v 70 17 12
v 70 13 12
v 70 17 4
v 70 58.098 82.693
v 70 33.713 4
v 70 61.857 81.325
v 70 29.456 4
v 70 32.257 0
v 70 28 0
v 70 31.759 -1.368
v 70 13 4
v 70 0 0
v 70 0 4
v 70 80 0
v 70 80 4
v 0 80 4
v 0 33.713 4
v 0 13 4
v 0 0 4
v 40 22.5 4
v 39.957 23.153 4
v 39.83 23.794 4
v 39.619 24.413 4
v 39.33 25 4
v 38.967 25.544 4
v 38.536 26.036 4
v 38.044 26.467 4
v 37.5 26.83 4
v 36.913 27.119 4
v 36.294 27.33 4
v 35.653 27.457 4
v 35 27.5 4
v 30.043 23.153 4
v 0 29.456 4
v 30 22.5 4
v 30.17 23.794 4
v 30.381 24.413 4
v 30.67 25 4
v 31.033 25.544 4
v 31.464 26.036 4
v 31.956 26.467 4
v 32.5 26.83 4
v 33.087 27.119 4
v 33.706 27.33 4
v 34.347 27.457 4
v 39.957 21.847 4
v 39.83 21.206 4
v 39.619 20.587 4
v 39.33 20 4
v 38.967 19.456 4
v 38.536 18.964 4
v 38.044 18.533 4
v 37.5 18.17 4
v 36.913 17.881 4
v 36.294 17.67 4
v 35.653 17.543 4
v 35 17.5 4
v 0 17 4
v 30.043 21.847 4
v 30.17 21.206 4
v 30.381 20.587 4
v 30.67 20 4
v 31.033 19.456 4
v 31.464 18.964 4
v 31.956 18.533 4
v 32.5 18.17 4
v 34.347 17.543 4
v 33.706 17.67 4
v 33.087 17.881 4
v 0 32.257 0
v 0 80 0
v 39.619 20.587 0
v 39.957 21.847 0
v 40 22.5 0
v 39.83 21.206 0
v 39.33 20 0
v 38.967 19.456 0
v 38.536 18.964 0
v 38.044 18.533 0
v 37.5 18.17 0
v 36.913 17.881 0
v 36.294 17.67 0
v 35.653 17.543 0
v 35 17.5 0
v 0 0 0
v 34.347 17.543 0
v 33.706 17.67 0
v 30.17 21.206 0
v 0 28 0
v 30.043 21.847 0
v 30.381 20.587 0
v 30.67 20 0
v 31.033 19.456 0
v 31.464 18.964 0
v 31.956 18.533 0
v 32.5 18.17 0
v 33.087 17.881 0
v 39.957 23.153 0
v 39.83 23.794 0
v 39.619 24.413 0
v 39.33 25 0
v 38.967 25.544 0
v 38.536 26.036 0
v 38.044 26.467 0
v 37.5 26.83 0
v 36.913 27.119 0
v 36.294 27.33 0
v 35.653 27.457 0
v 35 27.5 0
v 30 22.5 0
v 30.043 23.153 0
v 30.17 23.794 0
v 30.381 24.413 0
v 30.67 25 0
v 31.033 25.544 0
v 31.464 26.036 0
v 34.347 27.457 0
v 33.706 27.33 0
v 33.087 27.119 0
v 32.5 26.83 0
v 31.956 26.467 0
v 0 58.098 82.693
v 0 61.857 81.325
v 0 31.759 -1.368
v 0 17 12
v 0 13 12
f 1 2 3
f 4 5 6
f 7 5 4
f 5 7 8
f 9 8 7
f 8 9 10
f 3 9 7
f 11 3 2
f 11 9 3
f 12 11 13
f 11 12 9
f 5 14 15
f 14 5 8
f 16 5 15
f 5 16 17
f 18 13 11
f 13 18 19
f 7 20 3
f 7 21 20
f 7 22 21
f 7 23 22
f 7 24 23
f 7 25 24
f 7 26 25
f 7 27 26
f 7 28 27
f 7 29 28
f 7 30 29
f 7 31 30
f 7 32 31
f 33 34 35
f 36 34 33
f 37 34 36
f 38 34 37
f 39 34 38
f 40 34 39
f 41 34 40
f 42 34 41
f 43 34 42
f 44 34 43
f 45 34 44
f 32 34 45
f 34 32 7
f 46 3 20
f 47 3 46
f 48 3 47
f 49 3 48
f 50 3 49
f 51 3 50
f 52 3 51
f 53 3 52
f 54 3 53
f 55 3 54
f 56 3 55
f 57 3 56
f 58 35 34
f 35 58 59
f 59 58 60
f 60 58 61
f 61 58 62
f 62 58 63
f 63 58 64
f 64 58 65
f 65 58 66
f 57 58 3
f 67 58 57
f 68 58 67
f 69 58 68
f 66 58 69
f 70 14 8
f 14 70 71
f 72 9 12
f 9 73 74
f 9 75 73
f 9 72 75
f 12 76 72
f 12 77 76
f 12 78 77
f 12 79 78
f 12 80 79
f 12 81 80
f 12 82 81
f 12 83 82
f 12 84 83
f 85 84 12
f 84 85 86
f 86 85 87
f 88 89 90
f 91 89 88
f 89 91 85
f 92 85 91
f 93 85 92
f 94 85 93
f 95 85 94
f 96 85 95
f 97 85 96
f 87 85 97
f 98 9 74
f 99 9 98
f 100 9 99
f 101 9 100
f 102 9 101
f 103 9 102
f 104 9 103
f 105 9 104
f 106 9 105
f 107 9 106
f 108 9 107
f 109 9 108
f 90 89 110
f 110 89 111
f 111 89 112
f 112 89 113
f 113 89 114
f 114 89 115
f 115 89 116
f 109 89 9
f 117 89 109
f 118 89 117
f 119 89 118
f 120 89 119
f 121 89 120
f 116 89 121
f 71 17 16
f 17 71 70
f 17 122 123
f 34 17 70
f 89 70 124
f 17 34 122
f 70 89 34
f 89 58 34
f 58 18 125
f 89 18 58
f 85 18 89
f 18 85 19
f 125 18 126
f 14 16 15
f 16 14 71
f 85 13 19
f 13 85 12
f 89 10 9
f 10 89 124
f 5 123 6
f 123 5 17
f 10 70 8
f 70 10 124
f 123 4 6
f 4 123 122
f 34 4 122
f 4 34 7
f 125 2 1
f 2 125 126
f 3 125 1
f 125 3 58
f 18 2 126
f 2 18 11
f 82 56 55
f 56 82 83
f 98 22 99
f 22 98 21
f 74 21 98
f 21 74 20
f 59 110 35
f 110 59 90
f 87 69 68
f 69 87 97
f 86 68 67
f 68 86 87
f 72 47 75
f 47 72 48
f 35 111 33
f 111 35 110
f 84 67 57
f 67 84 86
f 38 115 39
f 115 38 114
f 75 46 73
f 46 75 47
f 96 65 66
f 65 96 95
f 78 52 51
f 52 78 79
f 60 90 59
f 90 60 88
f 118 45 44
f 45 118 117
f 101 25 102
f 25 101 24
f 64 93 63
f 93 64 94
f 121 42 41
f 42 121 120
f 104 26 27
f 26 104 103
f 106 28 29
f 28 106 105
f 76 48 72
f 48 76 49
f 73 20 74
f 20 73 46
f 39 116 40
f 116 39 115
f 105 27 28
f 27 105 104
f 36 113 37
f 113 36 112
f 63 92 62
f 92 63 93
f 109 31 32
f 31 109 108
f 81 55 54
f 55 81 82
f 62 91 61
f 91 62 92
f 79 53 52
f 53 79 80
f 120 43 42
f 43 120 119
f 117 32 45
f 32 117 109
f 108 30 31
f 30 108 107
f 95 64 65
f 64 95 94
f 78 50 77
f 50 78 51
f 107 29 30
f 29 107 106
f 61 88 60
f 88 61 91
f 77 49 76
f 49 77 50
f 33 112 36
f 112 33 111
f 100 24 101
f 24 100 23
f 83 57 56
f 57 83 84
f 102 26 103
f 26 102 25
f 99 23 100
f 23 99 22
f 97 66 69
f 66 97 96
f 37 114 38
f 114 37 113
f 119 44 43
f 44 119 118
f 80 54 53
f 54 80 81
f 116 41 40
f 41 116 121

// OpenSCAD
// Phone stand: a minimal, parametric example for OpenSuperCAD.
// Open this folder as a project and ask your agent to change it, e.g.
// "make it fit a tablet and add a cable slot".

/* [Phone] */
// Thickness of the phone including its case (mm)
phone_thickness = 11; // [6:0.5:16]
// Viewing angle from horizontal (degrees)
angle = 70; // [45:85]

/* [Stand] */
// Width of the stand (mm)
width = 70; // [40:120]
// Depth of the base (mm)
depth = 80; // [50:120]
// Wall / plate thickness (mm)
wall = 4; // [2:0.5:8]
// Add a hole for a charging cable
cable_hole = true;

/* [Hidden] */
$fn = 48;
eps = 0.01;

module base() {
  cube([width, depth, wall]);
}

module back_rest() {
  translate([0, depth * 0.35, 0])
    rotate([angle - 90, 0, 0])
      cube([width, wall, depth * 1.1]);
}

module lip() {
  translate([0, depth * 0.35 - phone_thickness - wall, 0])
    cube([width, wall, wall + 8]);
}

difference() {
  union() {
    base();
    back_rest();
    lip();
  }
  if (cable_hole)
    translate([width / 2, depth * 0.35 - phone_thickness / 2, -eps])
      cylinder(d = 10, h = wall + 2 * eps);
}
